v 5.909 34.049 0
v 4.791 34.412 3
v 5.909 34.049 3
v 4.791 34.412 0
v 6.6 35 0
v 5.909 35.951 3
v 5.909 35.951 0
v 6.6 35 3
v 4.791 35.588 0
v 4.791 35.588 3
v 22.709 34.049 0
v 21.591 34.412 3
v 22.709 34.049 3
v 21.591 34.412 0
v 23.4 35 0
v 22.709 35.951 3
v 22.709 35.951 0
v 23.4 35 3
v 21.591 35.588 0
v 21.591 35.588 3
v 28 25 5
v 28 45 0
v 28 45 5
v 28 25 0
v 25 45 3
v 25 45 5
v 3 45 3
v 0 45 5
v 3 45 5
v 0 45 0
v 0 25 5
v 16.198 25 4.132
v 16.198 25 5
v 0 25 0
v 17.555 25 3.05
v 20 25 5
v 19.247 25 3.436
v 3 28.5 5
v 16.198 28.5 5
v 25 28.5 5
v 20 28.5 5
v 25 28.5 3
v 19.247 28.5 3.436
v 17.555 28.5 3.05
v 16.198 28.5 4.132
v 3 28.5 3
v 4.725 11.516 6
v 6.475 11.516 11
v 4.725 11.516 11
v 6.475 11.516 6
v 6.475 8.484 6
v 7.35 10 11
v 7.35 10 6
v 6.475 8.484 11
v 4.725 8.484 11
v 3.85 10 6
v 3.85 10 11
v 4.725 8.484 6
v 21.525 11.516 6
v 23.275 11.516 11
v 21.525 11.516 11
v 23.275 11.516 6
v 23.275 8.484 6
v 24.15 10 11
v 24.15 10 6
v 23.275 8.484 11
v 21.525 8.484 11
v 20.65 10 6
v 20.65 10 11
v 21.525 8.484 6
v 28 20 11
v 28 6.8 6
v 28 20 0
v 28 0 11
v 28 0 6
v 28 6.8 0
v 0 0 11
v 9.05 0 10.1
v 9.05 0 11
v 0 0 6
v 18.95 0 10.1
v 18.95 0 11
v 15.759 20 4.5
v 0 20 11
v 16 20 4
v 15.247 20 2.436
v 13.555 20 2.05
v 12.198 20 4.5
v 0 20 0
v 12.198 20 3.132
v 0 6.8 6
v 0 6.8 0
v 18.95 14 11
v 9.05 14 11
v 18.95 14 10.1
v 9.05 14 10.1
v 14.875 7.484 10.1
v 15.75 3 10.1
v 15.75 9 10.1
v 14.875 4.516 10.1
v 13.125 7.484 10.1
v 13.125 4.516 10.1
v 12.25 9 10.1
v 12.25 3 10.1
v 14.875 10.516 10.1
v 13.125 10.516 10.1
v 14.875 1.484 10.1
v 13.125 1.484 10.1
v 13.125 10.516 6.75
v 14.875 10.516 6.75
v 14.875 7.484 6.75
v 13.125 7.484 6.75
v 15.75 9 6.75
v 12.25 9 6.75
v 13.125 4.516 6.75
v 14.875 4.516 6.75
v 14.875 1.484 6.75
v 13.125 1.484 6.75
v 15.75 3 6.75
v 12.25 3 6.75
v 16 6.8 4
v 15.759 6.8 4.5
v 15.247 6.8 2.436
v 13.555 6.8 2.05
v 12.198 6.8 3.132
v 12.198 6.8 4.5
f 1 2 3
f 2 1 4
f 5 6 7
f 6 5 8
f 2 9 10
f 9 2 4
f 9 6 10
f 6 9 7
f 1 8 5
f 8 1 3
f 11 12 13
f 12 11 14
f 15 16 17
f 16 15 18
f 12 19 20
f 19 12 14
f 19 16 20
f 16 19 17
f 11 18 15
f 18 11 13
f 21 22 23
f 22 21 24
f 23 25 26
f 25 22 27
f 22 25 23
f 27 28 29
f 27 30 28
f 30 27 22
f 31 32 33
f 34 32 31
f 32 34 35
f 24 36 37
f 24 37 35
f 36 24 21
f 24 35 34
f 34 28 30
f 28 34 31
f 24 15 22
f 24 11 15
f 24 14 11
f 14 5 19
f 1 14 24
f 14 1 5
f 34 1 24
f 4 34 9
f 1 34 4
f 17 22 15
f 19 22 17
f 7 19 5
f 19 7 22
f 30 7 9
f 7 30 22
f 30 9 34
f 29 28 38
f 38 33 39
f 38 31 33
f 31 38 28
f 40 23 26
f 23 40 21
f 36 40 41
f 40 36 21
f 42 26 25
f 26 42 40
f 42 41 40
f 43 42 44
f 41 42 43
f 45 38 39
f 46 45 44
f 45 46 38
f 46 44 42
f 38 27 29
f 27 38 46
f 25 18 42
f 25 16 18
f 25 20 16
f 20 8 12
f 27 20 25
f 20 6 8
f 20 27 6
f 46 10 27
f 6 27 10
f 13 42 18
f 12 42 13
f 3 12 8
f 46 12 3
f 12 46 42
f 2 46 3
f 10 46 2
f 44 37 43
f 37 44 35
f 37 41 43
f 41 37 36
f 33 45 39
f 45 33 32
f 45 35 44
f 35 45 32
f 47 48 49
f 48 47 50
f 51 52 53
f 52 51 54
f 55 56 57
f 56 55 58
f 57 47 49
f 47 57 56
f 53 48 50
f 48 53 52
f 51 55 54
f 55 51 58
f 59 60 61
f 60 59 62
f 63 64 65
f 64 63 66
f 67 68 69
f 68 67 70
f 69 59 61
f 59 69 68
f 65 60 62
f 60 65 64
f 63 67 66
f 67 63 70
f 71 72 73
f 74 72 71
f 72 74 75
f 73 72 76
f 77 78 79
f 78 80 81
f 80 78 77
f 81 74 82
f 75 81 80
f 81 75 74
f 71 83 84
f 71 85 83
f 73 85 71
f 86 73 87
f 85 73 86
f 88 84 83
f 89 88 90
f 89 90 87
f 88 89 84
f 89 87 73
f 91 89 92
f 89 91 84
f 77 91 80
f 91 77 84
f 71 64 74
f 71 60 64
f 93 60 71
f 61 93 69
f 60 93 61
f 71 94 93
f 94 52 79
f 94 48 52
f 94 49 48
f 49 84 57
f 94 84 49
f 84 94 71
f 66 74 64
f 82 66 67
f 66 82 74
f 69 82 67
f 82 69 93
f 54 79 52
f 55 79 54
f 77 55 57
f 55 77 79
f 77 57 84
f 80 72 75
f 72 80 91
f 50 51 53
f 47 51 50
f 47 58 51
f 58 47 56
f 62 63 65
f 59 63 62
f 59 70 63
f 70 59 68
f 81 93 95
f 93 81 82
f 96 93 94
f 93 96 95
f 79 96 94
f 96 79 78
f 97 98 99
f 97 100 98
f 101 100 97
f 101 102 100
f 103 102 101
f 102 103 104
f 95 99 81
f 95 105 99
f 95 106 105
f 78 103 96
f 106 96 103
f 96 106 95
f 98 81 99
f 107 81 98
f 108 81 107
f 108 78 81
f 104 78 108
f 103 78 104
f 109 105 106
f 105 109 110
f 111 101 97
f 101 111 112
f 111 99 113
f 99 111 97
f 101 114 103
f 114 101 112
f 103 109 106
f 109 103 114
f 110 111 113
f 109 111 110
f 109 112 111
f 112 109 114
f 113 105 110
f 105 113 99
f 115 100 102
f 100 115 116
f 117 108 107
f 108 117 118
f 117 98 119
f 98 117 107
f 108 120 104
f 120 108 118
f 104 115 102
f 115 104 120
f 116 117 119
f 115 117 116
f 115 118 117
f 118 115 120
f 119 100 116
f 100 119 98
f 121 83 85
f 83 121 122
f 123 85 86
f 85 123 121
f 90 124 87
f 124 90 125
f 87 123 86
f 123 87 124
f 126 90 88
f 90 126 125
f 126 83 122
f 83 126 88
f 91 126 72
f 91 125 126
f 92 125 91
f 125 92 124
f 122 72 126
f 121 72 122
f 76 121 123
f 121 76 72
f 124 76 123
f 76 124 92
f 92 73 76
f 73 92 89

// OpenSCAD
mount_width = 28;
mount_height = 20;
base_mount_depth = 5;
metal_width = 9.9;

module half_cylinder(height, radius) {
    difference() {
        cylinder(height, radius, radius);
        translate([-radius, 0.5, -0.5]) cube([radius*2, radius, height+1]);
    }
}

module screw_holes(radius = 1) {
    translate([5.6,2.5,10]) rotate([90,0,0]) cylinder(10, radius, radius, center = true);
    translate([mount_width - 5.6,2.5,10]) rotate([90,0,0]) cylinder(10, radius, radius, center = true);
}

module base_mount() {
    difference() {
        cube([mount_width,base_mount_depth,mount_height]);
        
    }
}

module headphone_mount_l() {
    difference() {
        base_mount();
        translate([3,-1,3.5]) cube([mount_width - 6, base_mount_depth - 2, mount_height - 3]);
        translate([0,1,0]) screw_holes();
        translate([(mount_width/2) + 4, 0, -0.5]) cylinder(5,2,2); 
    }
}

module headphone_mount_r() {
    heat_set_insert_radius = 3.5/2;
    
    difference() {
        mirror([0,1,0]) base_mount();
        
        translate([0,-4,0]) screw_holes(heat_set_insert_radius);
        translate([(mount_width / 2) - (metal_width / 2),-0.9,6]) cube([metal_width,1,30]);
        translate([(mount_width / 2),-2.5,11]) rotate([90,0,0]) cylinder(3.5, heat_set_insert_radius, heat_set_insert_radius, center = true);
        translate([(mount_width / 2),-2.5,11+6]) rotate([90,0,0]) cylinder(3.5, heat_set_insert_radius, heat_set_insert_radius, center = true);
    }
    
    attach_depth = 6;
    
    difference() {
        translate([0,-base_mount_depth-attach_depth,0]) cube([mount_width, attach_depth, mount_height*0.66]);
        translate([mount_width / 2, -7, -1]) half_cylinder(30, 2);
    }
}

translate([0,25,base_mount_depth]) rotate([-90,0,0]) headphone_mount_l();
translate([0,mount_height,base_mount_depth + 6]) rotate([90,0,0]) headphone_mount_r();
